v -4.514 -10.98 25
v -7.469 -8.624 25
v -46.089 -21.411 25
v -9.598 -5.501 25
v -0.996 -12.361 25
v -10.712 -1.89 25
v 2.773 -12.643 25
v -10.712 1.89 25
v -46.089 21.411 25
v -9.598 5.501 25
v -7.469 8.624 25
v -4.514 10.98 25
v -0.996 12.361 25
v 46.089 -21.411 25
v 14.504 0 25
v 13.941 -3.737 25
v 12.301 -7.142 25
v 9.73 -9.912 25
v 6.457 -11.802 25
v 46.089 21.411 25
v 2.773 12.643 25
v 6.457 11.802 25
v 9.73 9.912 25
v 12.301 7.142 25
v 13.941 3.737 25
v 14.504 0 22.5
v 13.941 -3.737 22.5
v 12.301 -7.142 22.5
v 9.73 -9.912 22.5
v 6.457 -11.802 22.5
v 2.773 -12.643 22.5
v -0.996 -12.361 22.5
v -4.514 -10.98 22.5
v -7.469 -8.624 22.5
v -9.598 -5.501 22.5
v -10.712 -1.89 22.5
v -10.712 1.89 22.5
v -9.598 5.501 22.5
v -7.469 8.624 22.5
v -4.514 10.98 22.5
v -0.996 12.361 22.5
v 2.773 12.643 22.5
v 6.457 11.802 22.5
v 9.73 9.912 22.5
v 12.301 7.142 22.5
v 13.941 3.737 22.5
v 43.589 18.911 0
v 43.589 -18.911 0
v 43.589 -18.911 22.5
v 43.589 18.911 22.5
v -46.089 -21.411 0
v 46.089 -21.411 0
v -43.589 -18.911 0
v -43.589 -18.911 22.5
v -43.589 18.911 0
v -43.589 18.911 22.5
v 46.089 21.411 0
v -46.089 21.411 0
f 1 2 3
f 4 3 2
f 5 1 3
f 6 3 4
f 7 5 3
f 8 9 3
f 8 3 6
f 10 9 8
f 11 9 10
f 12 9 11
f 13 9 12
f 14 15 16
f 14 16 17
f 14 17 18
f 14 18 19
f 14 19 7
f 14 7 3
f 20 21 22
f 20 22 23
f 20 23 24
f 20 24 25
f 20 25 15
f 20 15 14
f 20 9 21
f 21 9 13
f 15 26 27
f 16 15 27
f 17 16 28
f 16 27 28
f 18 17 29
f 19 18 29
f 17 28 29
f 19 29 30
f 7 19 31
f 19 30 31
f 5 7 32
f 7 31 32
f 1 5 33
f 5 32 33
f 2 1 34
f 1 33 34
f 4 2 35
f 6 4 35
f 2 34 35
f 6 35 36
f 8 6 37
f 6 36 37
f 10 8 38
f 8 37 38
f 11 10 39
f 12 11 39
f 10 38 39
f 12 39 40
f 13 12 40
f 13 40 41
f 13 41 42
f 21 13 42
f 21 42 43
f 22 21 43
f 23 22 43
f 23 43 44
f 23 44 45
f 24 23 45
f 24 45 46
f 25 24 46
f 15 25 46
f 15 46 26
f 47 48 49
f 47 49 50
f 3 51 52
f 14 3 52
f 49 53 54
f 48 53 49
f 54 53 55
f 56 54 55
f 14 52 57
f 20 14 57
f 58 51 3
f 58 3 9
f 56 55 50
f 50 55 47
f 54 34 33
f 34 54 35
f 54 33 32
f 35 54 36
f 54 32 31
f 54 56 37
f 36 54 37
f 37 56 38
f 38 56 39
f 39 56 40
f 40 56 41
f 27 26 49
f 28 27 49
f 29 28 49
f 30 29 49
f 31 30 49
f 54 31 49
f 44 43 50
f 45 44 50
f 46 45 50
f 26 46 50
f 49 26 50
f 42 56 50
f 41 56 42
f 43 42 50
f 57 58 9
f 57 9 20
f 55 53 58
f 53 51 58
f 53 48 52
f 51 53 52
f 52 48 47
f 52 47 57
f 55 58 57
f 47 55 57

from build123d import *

# Parameters (mm, degrees)
F0_W     = 92.177428
F0_H     = 42.82258
F1_DEPTH = 25
F2_T     = -2.5
F3_R     = 12.678487
F4_DEPTH = 73.8


with BuildPart() as f1:
    # F0 (on Top) → F1 (new body)
    with BuildSketch(Plane.XY):
        Rectangle(F0_W, F0_H)
    extrude(amount=F1_DEPTH)

    # F2
    f2_openings = [f1.faces().sort_by_distance(p)[0] for p in [
        (0, 0, 0),
    ]]
    offset(amount=F2_T, openings=f2_openings)

    # F3 (on face) → F4 (cut)
    with BuildSketch(Plane(origin=(0, 0, 22.5), x_dir=(1, 0, 0), z_dir=(0, 0, -1))):
        with Locations((1.825314, 0)):
            Circle(F3_R)
    extrude(amount=-F4_DEPTH, mode=Mode.SUBTRACT)


solid = f1.part
